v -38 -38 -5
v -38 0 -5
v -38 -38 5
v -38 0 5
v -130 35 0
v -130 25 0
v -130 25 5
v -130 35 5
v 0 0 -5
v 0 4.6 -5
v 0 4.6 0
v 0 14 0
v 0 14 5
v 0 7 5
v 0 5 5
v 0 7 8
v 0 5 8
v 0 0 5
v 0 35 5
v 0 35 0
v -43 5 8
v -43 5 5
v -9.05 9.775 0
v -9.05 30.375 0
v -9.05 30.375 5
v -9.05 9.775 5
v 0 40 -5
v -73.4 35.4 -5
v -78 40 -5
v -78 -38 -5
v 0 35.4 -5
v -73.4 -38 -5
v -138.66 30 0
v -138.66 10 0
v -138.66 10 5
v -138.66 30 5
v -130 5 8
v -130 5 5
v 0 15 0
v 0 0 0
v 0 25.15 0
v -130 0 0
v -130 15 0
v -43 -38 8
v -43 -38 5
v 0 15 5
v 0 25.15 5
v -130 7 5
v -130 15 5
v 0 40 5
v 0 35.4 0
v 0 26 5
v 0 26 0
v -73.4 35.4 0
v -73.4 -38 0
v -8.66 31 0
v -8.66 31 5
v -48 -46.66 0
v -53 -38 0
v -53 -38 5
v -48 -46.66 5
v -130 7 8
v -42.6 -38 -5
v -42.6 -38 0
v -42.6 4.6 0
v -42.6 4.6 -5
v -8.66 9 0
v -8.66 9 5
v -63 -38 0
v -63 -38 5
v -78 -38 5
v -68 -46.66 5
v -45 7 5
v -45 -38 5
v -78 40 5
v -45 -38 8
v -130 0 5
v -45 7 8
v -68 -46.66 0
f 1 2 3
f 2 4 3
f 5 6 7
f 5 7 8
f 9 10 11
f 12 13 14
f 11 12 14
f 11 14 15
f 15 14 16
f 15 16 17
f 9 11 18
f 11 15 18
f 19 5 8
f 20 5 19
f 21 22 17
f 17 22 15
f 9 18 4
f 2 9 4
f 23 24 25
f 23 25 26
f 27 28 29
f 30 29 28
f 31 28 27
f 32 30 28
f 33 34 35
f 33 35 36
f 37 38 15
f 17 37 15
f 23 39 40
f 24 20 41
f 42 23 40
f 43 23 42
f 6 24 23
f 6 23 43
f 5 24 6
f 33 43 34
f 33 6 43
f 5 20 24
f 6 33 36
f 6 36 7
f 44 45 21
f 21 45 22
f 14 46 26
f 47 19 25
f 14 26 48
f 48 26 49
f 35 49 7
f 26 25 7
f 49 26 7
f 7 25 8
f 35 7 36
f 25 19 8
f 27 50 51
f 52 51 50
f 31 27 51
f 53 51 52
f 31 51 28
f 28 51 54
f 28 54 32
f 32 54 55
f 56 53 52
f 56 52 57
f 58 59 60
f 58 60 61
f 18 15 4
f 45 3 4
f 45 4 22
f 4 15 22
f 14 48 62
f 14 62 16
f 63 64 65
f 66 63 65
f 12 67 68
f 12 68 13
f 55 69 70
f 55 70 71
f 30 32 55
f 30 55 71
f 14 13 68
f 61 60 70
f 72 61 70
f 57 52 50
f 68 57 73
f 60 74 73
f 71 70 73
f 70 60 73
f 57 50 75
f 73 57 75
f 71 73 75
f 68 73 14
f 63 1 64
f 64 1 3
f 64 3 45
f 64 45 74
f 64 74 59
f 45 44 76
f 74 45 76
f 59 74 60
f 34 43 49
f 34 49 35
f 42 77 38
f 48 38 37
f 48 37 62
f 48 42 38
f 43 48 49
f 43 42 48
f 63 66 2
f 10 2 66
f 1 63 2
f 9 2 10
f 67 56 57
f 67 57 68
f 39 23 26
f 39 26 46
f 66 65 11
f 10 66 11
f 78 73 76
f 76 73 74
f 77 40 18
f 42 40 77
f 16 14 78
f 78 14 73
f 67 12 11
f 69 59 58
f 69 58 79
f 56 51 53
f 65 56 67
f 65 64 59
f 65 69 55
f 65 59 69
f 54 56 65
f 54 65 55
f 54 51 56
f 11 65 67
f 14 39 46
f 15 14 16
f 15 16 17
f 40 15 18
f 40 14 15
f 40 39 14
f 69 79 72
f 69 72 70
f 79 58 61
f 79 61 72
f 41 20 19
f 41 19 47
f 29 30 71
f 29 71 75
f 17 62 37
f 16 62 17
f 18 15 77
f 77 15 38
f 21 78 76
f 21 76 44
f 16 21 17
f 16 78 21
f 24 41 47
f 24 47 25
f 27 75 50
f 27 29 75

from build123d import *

# Parameters (mm, degrees)
PAD_DEPTH    = 5
PAD001_DEPTH = 3
PAD002_DEPTH = 5
PAD003_DEPTH = 5
SKETCH004_W  = 130
SKETCH004_H  = 2
PAD004_DEPTH = 3


with BuildPart() as body:
    # Sketch → Pad (new body)
    with BuildSketch(Plane.XY):
        Polygon((0, 40), (0, 26), (-8.660254, 31), (-8.660254, 9), (0, 14), (0, 0), (-38, 0), (-38, -38), (-53, -38), (-48, -46.660254), (-68, -46.660254), (-63, -38), (-78, -38), (-78, 40), align=None)
    extrude(amount=PAD_DEPTH)

    # Sketch001 (on Face16 of Pad) → Pad001 (join)
    with BuildSketch(Plane.XY.offset(5)):
        Polygon((0, 7), (-45, 7), (-45, -38), (-43, -38), (-43, 5), (0, 5), align=None)
    extrude(amount=PAD001_DEPTH)

    # Sketch002 (on Face4 of Pad001) → Pad002 (join)
    with BuildSketch(Plane(origin=(0, 0, 0), x_dir=(1, 0, 0), z_dir=(0, 0, -1))):
        Polygon((0, 0), (-38, 0), (-38, 38), (-42.6, 38), (-42.6, -4.6), (0, -4.6), align=None)
        Polygon((0, -40), (0, -35.4), (-73.4, -35.4), (-73.4, 38), (-78, 38), (-78, -40), align=None)
    extrude(amount=PAD002_DEPTH)


with BuildPart() as body001:
    # Sketch003 → Pad003 (new body)
    with BuildSketch(Plane.XY):
        Polygon((0, 0), (-130, 0), (-130, 15), (-138.660254, 10), (-138.660254, 30), (-130, 25), (-130, 35), (0, 35), (0, 25.15), (-9.049965, 30.375), (-9.049965, 9.775), (0, 15), align=None)
    extrude(amount=PAD003_DEPTH)

    # Sketch004 (on Face14 of Pad003) → Pad004 (join)
    with BuildSketch(Plane.XY.offset(5)):
        with Locations((-65, 6)):
            Rectangle(SKETCH004_W, SKETCH004_H)
    extrude(amount=PAD004_DEPTH)


solid = Compound([body.part, body001.part])
